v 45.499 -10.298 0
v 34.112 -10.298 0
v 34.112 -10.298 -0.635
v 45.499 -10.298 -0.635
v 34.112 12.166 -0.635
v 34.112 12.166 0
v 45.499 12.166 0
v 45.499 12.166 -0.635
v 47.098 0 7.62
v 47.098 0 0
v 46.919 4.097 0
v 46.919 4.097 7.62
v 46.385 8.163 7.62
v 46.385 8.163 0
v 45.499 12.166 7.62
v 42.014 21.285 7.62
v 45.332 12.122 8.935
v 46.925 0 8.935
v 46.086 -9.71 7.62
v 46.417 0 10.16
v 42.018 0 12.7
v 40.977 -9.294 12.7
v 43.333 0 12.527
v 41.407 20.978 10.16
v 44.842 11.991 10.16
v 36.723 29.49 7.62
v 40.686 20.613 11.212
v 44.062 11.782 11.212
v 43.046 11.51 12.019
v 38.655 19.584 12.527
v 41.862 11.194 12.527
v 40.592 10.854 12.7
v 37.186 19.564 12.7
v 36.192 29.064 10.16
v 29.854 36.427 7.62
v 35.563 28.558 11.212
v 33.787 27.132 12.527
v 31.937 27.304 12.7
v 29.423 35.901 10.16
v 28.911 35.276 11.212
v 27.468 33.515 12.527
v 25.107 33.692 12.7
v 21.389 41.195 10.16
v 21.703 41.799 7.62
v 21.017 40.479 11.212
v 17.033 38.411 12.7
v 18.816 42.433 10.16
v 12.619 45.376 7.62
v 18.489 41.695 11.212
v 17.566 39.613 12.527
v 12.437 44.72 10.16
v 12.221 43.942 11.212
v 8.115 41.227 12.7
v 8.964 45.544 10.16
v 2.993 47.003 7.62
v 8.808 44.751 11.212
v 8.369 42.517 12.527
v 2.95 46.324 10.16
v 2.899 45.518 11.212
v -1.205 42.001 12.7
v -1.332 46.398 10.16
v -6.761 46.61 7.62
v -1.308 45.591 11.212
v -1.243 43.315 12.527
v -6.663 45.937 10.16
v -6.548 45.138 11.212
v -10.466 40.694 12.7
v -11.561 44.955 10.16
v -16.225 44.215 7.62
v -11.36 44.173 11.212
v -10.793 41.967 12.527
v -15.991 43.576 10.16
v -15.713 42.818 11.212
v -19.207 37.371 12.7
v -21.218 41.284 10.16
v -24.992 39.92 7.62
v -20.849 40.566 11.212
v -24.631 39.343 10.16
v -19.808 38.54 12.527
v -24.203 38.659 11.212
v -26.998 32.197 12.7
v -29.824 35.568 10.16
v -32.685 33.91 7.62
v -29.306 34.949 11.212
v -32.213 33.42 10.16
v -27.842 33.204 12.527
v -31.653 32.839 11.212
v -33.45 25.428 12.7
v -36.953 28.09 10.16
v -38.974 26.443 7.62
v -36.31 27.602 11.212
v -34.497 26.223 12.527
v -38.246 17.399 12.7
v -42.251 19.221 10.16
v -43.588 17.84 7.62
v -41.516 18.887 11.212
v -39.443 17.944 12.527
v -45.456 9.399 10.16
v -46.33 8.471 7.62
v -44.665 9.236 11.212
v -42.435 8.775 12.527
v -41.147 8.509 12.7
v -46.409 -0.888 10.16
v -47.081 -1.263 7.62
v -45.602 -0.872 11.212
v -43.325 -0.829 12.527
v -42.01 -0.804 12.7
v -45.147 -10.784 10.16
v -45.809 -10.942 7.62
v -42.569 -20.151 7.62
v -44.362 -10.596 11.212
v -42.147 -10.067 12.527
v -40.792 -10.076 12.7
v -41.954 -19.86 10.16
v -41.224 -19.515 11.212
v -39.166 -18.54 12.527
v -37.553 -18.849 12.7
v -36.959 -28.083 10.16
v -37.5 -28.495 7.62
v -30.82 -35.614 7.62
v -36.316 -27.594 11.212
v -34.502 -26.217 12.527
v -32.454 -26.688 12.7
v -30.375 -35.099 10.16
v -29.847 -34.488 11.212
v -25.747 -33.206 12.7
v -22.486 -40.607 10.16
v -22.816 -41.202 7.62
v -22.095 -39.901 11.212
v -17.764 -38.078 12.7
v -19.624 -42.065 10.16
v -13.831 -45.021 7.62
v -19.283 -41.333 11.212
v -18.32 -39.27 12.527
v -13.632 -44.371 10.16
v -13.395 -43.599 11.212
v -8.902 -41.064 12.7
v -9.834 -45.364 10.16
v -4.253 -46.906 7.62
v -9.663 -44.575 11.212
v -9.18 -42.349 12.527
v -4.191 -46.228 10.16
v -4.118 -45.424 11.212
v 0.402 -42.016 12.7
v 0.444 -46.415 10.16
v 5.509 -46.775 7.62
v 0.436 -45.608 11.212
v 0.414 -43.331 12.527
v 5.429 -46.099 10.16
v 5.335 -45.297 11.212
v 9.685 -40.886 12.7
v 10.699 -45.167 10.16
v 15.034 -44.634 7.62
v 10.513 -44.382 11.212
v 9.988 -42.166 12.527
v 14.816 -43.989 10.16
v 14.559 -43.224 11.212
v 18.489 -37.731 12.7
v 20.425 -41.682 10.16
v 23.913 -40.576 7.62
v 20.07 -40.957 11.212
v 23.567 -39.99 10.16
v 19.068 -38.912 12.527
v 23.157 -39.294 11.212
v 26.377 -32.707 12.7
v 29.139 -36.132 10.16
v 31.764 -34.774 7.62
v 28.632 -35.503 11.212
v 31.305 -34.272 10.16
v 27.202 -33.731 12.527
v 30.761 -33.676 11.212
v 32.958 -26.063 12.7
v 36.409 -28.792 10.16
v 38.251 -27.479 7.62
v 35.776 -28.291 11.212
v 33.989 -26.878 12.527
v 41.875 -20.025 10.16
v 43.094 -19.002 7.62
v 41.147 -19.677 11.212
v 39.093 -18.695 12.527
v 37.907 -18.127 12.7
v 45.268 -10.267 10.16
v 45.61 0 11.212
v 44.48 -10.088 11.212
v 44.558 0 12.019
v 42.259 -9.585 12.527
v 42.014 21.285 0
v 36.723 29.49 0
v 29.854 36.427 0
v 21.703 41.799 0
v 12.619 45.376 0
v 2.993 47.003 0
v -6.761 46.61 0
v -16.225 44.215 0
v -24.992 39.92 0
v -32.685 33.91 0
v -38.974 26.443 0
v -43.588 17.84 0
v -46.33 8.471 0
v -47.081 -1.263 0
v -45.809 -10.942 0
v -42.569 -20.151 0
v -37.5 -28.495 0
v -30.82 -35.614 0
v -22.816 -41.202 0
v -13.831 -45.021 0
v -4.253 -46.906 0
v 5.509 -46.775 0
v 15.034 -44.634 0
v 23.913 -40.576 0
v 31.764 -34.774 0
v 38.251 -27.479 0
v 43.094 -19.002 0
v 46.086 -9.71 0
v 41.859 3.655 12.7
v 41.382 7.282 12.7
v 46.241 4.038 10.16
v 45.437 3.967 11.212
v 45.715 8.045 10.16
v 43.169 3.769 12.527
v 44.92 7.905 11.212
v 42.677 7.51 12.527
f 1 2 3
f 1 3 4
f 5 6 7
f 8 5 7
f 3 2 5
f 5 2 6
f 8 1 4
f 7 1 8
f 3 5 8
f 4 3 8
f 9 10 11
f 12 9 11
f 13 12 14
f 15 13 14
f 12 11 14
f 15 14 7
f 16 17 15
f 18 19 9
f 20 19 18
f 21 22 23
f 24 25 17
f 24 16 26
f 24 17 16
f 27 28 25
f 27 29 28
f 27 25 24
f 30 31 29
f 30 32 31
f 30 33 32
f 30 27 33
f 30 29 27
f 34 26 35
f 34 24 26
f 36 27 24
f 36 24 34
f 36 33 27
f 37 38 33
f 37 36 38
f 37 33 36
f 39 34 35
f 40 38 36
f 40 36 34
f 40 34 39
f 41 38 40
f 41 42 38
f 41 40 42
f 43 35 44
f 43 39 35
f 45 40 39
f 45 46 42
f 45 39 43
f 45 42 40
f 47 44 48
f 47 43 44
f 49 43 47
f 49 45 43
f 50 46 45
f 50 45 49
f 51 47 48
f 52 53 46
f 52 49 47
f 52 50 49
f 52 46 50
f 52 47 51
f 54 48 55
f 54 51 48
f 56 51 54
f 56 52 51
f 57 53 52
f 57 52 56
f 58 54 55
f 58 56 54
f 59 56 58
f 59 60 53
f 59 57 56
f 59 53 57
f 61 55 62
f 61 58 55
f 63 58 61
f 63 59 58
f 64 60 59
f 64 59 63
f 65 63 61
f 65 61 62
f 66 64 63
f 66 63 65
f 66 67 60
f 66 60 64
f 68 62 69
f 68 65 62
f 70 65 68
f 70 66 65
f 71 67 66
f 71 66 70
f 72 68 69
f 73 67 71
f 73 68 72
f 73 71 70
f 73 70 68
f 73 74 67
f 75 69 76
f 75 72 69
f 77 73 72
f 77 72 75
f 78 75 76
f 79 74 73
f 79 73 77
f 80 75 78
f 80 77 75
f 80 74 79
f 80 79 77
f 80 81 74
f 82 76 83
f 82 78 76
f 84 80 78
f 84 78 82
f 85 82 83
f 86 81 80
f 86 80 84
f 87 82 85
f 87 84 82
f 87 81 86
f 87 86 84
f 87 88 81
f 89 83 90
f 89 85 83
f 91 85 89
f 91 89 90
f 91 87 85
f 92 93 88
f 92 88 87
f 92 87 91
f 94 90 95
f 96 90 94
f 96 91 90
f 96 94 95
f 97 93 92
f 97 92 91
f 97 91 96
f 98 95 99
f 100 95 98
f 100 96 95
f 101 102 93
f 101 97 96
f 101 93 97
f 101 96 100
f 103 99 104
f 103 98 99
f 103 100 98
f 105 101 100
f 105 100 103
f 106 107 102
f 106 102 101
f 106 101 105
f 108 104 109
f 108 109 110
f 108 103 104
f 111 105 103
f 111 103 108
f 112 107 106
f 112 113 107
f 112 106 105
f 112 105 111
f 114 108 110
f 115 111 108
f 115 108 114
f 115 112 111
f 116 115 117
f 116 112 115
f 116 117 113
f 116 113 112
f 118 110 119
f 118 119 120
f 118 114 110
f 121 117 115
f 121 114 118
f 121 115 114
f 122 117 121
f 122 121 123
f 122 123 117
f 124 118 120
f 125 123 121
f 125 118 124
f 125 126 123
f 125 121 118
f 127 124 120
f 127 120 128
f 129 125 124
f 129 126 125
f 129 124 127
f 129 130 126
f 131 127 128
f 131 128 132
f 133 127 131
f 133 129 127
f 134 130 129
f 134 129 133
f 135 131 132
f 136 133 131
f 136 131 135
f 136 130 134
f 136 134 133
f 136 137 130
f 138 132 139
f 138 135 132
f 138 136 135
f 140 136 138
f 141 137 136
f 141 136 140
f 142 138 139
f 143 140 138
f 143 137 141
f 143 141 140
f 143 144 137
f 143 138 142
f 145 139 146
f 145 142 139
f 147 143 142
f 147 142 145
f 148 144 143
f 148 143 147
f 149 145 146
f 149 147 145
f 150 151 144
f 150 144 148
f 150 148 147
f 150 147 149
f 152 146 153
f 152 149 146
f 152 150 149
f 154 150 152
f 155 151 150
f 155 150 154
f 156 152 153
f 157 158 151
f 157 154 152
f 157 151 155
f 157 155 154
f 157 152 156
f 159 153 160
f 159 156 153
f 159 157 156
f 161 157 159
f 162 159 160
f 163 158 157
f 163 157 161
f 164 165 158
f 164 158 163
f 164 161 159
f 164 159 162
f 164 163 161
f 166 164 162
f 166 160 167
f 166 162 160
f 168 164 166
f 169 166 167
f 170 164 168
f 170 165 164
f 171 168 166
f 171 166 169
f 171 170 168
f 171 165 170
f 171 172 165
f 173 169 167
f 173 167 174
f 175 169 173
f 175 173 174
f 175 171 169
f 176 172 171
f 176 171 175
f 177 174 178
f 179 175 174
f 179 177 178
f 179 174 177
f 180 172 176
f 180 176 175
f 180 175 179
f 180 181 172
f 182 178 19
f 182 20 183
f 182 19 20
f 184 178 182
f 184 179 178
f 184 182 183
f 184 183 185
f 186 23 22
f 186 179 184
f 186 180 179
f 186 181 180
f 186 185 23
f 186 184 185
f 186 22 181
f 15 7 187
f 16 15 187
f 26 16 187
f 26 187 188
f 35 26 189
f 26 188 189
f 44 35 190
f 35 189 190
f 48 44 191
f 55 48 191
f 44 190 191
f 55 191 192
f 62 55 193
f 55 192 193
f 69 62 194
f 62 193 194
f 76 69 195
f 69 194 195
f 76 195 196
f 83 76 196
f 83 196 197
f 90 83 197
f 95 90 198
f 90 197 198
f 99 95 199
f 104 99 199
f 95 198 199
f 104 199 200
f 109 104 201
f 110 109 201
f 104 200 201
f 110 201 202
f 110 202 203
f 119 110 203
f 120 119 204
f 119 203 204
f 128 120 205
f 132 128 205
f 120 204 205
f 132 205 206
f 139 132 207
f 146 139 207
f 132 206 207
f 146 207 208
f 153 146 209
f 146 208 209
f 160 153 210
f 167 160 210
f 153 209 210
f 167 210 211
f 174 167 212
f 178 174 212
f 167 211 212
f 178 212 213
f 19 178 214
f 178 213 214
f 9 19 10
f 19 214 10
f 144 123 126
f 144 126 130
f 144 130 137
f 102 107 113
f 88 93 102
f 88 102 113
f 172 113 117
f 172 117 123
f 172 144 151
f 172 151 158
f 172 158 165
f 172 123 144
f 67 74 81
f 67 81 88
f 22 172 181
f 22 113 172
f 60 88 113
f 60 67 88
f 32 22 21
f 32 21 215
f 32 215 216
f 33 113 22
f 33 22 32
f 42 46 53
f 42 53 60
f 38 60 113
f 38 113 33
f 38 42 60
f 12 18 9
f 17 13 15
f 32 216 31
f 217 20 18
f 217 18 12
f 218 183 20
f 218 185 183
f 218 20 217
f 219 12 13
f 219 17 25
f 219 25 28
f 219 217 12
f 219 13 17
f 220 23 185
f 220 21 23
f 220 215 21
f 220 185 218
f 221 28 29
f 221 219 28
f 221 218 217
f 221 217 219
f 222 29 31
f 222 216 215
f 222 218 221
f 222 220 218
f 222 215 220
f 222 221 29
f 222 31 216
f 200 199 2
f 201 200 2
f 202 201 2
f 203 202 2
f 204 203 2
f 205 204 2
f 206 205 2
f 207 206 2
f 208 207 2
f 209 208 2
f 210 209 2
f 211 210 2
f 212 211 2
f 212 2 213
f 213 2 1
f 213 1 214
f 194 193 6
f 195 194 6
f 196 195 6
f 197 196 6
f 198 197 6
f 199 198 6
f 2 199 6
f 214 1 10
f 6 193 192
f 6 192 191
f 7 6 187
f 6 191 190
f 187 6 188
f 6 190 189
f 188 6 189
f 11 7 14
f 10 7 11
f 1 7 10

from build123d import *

# Parameters (mm, degrees)
F0_W     = 11.387274
F0_H     = 22.464488
F1_DEPTH = 12.7
F2_R     = 5.08
F3_DEPTH = 0.635


with BuildPart() as f1:
    # F0 (on Top) → F1 (new body)
    with BuildSketch(Plane.XY):
        with BuildLine():
            ThreePointArc((45.499377, 12.166495), (-46.696597, -6.135533), (47.09795, 0))
            ThreePointArc((47.09795, 0), (46.696597, 6.135533), (45.499377, 12.166495))
        make_face()
        with Locations((39.80574, 0.934251)):
            Rectangle(F0_W, F0_H, mode=Mode.SUBTRACT)
        with Locations((39.80574, 0.934251)):
            Rectangle(F0_W, F0_H)
    extrude(amount=F1_DEPTH)

    # F2
    f2_edges = [f1.edges().sort_by_distance(p)[0] for p in [
        (-47.09795, 0, 12.7),
    ]]
    fillet(f2_edges, radius=F2_R)

    # F0 (on Top) → F3 (join)
    with BuildSketch(Plane.XY):
        with Locations((39.80574, 0.934251)):
            Rectangle(F0_W, F0_H)
    extrude(amount=-F3_DEPTH)


solid = f1.part
